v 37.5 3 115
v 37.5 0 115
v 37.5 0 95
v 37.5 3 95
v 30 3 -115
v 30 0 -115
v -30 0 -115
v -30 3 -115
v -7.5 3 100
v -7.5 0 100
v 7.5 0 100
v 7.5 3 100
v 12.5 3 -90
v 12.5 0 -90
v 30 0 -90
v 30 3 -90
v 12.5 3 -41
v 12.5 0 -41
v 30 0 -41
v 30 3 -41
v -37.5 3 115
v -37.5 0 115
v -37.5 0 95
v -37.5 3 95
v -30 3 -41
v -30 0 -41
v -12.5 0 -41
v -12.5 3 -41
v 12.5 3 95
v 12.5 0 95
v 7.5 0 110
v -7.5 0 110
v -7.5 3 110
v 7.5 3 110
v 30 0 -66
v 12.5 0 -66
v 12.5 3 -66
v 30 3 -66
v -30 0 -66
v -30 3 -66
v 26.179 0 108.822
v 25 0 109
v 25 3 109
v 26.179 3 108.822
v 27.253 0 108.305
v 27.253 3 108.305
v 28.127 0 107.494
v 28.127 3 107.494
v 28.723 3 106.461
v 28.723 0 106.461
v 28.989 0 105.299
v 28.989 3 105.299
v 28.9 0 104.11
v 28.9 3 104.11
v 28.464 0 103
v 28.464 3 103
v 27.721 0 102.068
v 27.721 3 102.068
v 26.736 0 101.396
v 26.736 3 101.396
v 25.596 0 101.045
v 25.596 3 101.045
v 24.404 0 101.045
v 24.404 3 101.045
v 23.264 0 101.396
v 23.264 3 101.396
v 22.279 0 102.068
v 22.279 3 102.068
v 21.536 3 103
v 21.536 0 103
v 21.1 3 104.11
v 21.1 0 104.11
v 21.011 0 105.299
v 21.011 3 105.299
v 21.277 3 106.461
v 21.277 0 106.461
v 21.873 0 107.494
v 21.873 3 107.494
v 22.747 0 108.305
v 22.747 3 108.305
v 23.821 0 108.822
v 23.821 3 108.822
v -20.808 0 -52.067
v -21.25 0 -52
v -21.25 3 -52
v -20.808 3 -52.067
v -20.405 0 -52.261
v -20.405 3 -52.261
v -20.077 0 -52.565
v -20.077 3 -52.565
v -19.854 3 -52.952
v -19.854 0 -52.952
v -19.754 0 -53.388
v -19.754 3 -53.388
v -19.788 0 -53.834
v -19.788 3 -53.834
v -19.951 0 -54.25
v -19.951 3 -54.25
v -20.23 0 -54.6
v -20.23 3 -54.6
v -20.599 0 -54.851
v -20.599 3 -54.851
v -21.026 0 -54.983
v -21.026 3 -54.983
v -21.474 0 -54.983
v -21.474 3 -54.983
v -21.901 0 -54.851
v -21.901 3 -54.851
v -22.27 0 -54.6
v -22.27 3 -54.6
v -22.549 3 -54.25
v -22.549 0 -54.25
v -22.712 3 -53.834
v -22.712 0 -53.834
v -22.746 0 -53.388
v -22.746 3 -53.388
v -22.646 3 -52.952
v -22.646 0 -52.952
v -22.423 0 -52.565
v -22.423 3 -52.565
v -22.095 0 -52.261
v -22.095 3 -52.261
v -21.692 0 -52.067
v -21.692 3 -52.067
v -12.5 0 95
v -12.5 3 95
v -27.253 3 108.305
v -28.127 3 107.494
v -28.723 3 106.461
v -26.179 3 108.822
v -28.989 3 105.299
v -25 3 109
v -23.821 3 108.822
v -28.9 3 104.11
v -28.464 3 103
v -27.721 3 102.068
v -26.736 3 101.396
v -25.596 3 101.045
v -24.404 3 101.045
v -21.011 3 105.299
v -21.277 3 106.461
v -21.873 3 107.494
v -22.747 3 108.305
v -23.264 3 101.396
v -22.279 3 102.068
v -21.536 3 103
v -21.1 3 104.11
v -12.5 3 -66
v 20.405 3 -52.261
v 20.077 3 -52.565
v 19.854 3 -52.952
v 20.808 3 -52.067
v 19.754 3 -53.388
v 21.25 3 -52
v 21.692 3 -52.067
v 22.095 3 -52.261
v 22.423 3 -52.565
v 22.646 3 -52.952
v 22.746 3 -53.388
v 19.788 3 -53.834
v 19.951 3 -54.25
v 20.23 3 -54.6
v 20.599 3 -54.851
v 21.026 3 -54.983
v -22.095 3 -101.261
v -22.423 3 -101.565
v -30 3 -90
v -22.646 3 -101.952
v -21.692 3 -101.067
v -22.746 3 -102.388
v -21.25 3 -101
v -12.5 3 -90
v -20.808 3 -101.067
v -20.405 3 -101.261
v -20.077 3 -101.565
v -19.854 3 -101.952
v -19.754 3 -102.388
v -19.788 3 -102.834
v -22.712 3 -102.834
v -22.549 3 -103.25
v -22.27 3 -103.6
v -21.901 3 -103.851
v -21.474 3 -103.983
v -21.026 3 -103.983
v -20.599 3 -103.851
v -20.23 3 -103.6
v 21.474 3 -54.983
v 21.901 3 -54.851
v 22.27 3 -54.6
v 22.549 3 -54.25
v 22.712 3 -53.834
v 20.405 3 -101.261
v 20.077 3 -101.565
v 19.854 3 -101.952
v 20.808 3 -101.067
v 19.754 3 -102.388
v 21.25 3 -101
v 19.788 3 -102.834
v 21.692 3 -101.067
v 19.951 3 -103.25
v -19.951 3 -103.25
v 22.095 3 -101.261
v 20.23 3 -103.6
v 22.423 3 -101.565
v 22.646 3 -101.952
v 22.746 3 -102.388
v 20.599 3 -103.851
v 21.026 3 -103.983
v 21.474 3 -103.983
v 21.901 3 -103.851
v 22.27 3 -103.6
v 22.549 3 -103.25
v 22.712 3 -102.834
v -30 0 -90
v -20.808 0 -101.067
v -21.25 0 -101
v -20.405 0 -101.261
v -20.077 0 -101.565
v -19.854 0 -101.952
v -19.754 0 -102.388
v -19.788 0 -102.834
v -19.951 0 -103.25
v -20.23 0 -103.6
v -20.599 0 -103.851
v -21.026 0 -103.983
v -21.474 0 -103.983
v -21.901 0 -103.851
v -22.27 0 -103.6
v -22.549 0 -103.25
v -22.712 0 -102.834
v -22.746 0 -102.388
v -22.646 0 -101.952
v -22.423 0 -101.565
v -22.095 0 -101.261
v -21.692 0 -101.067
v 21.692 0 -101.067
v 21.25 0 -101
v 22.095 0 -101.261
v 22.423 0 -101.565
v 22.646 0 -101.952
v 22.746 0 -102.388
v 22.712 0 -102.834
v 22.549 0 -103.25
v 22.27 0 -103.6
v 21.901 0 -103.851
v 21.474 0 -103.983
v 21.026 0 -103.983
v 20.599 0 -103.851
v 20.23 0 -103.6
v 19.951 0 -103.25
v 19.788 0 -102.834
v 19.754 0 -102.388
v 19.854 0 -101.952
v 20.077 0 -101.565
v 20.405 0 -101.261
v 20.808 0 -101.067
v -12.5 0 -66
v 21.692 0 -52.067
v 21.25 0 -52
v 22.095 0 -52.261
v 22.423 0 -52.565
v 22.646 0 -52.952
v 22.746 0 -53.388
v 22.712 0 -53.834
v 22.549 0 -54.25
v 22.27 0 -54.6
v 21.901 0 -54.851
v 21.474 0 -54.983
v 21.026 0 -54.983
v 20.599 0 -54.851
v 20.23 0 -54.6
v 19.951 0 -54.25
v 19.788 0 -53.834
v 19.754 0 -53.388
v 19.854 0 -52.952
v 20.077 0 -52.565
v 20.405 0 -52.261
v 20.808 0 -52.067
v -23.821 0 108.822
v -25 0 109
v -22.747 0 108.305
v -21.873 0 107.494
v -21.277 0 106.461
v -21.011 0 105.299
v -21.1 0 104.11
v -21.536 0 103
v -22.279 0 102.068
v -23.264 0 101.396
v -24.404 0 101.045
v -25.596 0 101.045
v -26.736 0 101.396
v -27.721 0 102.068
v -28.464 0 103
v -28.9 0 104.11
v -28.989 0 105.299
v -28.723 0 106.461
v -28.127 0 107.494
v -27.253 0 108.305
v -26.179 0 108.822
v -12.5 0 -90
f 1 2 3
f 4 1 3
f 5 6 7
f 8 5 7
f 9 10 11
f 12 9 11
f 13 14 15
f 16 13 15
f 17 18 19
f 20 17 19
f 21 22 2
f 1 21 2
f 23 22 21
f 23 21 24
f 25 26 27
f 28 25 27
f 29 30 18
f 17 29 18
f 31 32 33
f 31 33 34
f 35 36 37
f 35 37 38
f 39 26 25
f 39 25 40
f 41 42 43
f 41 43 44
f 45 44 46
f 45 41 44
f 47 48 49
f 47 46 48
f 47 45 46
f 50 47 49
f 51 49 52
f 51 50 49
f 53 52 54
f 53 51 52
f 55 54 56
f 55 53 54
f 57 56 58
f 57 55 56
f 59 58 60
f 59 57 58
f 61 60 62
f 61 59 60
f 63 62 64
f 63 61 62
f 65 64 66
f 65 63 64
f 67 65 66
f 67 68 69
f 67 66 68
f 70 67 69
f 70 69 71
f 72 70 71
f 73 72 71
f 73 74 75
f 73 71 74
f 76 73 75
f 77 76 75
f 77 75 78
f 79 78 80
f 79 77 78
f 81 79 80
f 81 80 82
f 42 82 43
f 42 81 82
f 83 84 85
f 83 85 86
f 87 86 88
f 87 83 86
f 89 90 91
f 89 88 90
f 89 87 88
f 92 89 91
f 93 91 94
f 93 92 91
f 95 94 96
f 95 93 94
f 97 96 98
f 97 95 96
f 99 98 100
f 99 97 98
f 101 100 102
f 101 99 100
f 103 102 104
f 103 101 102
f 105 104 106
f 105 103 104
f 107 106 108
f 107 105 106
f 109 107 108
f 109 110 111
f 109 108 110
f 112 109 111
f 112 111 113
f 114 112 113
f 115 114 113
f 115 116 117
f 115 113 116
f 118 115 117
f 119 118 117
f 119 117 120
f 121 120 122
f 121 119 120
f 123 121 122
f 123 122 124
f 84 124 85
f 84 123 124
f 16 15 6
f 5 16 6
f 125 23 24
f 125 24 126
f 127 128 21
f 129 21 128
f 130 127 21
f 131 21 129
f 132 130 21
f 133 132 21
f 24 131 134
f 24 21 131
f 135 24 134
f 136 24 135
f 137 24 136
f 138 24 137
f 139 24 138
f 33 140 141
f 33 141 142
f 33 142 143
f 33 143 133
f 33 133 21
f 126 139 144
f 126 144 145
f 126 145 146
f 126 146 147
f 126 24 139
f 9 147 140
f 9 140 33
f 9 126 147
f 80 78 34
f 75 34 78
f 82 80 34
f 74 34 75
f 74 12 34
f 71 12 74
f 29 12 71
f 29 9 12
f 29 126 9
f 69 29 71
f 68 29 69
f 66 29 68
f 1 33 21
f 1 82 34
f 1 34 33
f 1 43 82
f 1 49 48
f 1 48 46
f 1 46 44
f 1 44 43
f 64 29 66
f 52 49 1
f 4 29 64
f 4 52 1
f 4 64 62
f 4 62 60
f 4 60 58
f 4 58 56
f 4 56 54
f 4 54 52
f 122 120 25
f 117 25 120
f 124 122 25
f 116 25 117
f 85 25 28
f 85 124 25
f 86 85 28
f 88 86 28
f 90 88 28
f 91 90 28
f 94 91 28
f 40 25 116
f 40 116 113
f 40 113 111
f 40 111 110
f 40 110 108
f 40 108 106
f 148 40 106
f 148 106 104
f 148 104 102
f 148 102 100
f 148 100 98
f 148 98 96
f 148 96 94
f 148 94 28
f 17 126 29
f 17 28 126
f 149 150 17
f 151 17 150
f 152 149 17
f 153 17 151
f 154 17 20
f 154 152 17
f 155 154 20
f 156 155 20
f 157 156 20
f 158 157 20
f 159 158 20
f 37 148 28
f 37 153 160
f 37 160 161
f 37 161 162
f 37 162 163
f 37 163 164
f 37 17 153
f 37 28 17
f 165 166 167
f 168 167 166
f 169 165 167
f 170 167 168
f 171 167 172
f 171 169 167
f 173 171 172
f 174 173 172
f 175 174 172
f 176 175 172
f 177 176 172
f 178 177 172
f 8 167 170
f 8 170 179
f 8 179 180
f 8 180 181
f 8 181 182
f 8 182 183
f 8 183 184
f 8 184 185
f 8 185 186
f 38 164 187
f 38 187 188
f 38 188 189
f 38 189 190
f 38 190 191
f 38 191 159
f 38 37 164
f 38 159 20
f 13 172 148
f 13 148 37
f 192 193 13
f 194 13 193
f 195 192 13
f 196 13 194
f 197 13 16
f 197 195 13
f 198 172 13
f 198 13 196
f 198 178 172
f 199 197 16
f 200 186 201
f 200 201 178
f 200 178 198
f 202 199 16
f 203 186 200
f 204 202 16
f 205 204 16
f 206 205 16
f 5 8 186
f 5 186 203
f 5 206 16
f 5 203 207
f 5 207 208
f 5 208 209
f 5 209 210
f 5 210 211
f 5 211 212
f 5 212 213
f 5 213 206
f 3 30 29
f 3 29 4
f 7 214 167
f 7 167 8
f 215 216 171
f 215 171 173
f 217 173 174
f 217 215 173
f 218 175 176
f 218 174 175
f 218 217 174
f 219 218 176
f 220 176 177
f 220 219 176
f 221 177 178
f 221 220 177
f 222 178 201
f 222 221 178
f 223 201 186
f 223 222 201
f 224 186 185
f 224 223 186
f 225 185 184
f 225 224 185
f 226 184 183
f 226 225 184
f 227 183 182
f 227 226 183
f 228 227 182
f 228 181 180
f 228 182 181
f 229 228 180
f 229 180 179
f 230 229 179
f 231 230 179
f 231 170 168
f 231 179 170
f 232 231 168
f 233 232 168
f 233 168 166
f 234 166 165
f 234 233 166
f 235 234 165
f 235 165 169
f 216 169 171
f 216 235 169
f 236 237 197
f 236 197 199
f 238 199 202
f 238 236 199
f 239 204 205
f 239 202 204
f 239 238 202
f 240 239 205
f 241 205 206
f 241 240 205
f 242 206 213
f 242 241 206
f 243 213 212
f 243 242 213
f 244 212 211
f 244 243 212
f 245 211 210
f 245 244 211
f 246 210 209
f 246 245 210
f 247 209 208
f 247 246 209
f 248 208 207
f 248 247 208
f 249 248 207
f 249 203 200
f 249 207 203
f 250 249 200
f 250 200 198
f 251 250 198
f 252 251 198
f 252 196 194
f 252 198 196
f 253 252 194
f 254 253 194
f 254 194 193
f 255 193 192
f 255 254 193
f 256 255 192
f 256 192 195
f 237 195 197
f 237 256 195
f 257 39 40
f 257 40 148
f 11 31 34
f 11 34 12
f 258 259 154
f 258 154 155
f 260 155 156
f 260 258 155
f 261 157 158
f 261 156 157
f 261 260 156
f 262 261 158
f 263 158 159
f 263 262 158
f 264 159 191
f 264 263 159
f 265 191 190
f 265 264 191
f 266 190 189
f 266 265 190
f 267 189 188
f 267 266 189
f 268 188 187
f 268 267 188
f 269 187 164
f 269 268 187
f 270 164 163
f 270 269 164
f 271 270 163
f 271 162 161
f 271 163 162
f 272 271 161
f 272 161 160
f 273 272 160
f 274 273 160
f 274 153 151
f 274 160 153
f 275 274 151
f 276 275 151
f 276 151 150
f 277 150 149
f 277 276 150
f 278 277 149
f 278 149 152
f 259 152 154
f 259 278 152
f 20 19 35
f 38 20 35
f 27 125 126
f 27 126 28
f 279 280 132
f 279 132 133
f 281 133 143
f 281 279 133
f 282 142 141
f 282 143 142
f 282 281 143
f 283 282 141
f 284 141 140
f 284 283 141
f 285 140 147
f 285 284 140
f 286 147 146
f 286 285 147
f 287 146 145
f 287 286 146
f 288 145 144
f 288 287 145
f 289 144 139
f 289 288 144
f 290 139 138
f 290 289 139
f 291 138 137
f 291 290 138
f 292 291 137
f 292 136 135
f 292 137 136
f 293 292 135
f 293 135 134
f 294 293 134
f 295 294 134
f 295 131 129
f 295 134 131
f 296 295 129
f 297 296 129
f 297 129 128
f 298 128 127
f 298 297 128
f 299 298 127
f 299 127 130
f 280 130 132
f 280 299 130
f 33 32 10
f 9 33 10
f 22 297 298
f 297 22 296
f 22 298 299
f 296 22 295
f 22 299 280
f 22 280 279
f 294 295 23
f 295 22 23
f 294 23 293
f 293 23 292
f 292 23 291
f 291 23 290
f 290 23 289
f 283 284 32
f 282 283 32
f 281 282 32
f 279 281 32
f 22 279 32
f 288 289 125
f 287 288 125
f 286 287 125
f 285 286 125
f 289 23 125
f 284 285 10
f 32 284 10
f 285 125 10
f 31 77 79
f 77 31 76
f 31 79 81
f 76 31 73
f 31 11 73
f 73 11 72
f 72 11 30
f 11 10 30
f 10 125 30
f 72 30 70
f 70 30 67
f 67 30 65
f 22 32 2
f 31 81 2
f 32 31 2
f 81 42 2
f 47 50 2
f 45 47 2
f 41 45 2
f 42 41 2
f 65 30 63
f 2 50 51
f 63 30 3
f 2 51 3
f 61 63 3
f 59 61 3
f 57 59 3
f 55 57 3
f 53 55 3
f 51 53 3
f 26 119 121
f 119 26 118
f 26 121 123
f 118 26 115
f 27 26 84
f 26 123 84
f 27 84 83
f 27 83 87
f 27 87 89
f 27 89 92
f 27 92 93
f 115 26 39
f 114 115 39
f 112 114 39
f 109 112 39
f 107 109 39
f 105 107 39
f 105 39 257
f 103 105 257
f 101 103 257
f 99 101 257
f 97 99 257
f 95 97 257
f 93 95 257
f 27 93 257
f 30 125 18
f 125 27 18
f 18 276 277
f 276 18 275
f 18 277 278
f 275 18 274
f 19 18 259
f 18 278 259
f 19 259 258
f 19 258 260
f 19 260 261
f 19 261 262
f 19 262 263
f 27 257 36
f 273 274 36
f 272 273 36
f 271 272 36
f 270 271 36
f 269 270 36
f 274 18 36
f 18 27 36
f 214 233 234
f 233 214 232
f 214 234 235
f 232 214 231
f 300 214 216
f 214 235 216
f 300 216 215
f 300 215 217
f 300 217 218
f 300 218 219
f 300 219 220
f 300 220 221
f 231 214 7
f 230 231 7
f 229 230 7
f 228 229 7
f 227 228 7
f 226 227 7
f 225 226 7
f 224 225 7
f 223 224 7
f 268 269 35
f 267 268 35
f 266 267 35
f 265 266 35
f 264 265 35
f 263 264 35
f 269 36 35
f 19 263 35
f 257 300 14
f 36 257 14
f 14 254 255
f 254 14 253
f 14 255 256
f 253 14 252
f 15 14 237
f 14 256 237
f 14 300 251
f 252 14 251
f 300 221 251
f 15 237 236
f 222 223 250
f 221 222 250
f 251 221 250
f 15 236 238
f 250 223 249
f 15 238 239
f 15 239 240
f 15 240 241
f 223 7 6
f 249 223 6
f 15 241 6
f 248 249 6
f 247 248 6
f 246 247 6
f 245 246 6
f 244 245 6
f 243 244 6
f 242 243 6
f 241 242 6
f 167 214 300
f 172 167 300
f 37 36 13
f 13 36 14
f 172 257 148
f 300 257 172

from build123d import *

# Parameters (mm, degrees)
SKETCH1_W               = 17.5
SKETCH1_H               = 25
SKETCH1_W_2             = 25
SKETCH1_H_2             = 230
SKETCH1_H_3             = 20
BOSS_EXTRUDE1_DEPTH     = 3
CUT_EXTRUDE1_DEPTH      = 121.996900787
CUT_EXTRUDE1_DEPTH_BACK = 121.996900787
SKETCH2_R               = 1.5
CUT_EXTRUDE2_DEPTH      = 121.996900787
CUT_EXTRUDE2_DEPTH_BACK = 121.996900787
SKETCH3_R               = 4
SKETCH3_W               = 15
SKETCH3_H               = 10


with BuildPart() as part:
    # Sketch1 → Boss-Extrude1 (new body)
    with BuildSketch(Plane(origin=(0, 0, 0), x_dir=(1, 0, 0), z_dir=(0, 1, 0))):
        with Locations((21.25, 53.5)):
            Rectangle(SKETCH1_W, SKETCH1_H)
        Rectangle(SKETCH1_W_2, SKETCH1_H_2)
        with Locations((-21.25, 53.5)):
            Rectangle(SKETCH1_W, SKETCH1_H)
        with Locations((21.25, 102.5)):
            Rectangle(SKETCH1_W, SKETCH1_H)
        with Locations((-21.25, 102.5)):
            Rectangle(SKETCH1_W, SKETCH1_H)
        with Locations((-25, -105)):
            Rectangle(SKETCH1_W_2, SKETCH1_H_3)
        with Locations((25, -105)):
            Rectangle(SKETCH1_W_2, SKETCH1_H_3)
    extrude(amount=BOSS_EXTRUDE1_DEPTH)

    # Sketch2 → Cut-Extrude1 (cut, two sides: drawn at the far end of the back side and taken through both)
    with BuildSketch(Plane(origin=(0, 3, 0), x_dir=(1, 0, 0), z_dir=(0, 1, 0)).offset(-CUT_EXTRUDE1_DEPTH_BACK)):
        with Locations(Location((-21.25, 102.5, 0), (0, 0, 270))):
            Circle(SKETCH2_R)
        with Locations(Location((21.25, 102.5, 0), (0, 0, 270))):
            Circle(SKETCH2_R)
        with Locations(Location((-21.25, 53.5, 0), (0, 0, 270))):
            Circle(SKETCH2_R)
        with Locations(Location((21.25, 53.5, 0), (0, 0, 270))):
            Circle(SKETCH2_R)
    extrude(amount=CUT_EXTRUDE1_DEPTH + CUT_EXTRUDE1_DEPTH_BACK, mode=Mode.SUBTRACT)

    # Sketch3 → Cut-Extrude2 (cut, two sides: drawn at the far end of the back side and taken through both)
    with BuildSketch(Plane(origin=(0, 3, 0), x_dir=(1, 0, 0), z_dir=(0, 1, 0)).offset(-CUT_EXTRUDE2_DEPTH_BACK)):
        with Locations(Location((-25, -105, 0), (0, 0, 270))):
            Circle(SKETCH3_R)
        with Locations(Location((25, -105, 0), (0, 0, 270))):
            Circle(SKETCH3_R)
        with Locations((0, -105)):
            Rectangle(SKETCH3_W, SKETCH3_H)
    extrude(amount=CUT_EXTRUDE2_DEPTH + CUT_EXTRUDE2_DEPTH_BACK, mode=Mode.SUBTRACT)


solid = part.part
